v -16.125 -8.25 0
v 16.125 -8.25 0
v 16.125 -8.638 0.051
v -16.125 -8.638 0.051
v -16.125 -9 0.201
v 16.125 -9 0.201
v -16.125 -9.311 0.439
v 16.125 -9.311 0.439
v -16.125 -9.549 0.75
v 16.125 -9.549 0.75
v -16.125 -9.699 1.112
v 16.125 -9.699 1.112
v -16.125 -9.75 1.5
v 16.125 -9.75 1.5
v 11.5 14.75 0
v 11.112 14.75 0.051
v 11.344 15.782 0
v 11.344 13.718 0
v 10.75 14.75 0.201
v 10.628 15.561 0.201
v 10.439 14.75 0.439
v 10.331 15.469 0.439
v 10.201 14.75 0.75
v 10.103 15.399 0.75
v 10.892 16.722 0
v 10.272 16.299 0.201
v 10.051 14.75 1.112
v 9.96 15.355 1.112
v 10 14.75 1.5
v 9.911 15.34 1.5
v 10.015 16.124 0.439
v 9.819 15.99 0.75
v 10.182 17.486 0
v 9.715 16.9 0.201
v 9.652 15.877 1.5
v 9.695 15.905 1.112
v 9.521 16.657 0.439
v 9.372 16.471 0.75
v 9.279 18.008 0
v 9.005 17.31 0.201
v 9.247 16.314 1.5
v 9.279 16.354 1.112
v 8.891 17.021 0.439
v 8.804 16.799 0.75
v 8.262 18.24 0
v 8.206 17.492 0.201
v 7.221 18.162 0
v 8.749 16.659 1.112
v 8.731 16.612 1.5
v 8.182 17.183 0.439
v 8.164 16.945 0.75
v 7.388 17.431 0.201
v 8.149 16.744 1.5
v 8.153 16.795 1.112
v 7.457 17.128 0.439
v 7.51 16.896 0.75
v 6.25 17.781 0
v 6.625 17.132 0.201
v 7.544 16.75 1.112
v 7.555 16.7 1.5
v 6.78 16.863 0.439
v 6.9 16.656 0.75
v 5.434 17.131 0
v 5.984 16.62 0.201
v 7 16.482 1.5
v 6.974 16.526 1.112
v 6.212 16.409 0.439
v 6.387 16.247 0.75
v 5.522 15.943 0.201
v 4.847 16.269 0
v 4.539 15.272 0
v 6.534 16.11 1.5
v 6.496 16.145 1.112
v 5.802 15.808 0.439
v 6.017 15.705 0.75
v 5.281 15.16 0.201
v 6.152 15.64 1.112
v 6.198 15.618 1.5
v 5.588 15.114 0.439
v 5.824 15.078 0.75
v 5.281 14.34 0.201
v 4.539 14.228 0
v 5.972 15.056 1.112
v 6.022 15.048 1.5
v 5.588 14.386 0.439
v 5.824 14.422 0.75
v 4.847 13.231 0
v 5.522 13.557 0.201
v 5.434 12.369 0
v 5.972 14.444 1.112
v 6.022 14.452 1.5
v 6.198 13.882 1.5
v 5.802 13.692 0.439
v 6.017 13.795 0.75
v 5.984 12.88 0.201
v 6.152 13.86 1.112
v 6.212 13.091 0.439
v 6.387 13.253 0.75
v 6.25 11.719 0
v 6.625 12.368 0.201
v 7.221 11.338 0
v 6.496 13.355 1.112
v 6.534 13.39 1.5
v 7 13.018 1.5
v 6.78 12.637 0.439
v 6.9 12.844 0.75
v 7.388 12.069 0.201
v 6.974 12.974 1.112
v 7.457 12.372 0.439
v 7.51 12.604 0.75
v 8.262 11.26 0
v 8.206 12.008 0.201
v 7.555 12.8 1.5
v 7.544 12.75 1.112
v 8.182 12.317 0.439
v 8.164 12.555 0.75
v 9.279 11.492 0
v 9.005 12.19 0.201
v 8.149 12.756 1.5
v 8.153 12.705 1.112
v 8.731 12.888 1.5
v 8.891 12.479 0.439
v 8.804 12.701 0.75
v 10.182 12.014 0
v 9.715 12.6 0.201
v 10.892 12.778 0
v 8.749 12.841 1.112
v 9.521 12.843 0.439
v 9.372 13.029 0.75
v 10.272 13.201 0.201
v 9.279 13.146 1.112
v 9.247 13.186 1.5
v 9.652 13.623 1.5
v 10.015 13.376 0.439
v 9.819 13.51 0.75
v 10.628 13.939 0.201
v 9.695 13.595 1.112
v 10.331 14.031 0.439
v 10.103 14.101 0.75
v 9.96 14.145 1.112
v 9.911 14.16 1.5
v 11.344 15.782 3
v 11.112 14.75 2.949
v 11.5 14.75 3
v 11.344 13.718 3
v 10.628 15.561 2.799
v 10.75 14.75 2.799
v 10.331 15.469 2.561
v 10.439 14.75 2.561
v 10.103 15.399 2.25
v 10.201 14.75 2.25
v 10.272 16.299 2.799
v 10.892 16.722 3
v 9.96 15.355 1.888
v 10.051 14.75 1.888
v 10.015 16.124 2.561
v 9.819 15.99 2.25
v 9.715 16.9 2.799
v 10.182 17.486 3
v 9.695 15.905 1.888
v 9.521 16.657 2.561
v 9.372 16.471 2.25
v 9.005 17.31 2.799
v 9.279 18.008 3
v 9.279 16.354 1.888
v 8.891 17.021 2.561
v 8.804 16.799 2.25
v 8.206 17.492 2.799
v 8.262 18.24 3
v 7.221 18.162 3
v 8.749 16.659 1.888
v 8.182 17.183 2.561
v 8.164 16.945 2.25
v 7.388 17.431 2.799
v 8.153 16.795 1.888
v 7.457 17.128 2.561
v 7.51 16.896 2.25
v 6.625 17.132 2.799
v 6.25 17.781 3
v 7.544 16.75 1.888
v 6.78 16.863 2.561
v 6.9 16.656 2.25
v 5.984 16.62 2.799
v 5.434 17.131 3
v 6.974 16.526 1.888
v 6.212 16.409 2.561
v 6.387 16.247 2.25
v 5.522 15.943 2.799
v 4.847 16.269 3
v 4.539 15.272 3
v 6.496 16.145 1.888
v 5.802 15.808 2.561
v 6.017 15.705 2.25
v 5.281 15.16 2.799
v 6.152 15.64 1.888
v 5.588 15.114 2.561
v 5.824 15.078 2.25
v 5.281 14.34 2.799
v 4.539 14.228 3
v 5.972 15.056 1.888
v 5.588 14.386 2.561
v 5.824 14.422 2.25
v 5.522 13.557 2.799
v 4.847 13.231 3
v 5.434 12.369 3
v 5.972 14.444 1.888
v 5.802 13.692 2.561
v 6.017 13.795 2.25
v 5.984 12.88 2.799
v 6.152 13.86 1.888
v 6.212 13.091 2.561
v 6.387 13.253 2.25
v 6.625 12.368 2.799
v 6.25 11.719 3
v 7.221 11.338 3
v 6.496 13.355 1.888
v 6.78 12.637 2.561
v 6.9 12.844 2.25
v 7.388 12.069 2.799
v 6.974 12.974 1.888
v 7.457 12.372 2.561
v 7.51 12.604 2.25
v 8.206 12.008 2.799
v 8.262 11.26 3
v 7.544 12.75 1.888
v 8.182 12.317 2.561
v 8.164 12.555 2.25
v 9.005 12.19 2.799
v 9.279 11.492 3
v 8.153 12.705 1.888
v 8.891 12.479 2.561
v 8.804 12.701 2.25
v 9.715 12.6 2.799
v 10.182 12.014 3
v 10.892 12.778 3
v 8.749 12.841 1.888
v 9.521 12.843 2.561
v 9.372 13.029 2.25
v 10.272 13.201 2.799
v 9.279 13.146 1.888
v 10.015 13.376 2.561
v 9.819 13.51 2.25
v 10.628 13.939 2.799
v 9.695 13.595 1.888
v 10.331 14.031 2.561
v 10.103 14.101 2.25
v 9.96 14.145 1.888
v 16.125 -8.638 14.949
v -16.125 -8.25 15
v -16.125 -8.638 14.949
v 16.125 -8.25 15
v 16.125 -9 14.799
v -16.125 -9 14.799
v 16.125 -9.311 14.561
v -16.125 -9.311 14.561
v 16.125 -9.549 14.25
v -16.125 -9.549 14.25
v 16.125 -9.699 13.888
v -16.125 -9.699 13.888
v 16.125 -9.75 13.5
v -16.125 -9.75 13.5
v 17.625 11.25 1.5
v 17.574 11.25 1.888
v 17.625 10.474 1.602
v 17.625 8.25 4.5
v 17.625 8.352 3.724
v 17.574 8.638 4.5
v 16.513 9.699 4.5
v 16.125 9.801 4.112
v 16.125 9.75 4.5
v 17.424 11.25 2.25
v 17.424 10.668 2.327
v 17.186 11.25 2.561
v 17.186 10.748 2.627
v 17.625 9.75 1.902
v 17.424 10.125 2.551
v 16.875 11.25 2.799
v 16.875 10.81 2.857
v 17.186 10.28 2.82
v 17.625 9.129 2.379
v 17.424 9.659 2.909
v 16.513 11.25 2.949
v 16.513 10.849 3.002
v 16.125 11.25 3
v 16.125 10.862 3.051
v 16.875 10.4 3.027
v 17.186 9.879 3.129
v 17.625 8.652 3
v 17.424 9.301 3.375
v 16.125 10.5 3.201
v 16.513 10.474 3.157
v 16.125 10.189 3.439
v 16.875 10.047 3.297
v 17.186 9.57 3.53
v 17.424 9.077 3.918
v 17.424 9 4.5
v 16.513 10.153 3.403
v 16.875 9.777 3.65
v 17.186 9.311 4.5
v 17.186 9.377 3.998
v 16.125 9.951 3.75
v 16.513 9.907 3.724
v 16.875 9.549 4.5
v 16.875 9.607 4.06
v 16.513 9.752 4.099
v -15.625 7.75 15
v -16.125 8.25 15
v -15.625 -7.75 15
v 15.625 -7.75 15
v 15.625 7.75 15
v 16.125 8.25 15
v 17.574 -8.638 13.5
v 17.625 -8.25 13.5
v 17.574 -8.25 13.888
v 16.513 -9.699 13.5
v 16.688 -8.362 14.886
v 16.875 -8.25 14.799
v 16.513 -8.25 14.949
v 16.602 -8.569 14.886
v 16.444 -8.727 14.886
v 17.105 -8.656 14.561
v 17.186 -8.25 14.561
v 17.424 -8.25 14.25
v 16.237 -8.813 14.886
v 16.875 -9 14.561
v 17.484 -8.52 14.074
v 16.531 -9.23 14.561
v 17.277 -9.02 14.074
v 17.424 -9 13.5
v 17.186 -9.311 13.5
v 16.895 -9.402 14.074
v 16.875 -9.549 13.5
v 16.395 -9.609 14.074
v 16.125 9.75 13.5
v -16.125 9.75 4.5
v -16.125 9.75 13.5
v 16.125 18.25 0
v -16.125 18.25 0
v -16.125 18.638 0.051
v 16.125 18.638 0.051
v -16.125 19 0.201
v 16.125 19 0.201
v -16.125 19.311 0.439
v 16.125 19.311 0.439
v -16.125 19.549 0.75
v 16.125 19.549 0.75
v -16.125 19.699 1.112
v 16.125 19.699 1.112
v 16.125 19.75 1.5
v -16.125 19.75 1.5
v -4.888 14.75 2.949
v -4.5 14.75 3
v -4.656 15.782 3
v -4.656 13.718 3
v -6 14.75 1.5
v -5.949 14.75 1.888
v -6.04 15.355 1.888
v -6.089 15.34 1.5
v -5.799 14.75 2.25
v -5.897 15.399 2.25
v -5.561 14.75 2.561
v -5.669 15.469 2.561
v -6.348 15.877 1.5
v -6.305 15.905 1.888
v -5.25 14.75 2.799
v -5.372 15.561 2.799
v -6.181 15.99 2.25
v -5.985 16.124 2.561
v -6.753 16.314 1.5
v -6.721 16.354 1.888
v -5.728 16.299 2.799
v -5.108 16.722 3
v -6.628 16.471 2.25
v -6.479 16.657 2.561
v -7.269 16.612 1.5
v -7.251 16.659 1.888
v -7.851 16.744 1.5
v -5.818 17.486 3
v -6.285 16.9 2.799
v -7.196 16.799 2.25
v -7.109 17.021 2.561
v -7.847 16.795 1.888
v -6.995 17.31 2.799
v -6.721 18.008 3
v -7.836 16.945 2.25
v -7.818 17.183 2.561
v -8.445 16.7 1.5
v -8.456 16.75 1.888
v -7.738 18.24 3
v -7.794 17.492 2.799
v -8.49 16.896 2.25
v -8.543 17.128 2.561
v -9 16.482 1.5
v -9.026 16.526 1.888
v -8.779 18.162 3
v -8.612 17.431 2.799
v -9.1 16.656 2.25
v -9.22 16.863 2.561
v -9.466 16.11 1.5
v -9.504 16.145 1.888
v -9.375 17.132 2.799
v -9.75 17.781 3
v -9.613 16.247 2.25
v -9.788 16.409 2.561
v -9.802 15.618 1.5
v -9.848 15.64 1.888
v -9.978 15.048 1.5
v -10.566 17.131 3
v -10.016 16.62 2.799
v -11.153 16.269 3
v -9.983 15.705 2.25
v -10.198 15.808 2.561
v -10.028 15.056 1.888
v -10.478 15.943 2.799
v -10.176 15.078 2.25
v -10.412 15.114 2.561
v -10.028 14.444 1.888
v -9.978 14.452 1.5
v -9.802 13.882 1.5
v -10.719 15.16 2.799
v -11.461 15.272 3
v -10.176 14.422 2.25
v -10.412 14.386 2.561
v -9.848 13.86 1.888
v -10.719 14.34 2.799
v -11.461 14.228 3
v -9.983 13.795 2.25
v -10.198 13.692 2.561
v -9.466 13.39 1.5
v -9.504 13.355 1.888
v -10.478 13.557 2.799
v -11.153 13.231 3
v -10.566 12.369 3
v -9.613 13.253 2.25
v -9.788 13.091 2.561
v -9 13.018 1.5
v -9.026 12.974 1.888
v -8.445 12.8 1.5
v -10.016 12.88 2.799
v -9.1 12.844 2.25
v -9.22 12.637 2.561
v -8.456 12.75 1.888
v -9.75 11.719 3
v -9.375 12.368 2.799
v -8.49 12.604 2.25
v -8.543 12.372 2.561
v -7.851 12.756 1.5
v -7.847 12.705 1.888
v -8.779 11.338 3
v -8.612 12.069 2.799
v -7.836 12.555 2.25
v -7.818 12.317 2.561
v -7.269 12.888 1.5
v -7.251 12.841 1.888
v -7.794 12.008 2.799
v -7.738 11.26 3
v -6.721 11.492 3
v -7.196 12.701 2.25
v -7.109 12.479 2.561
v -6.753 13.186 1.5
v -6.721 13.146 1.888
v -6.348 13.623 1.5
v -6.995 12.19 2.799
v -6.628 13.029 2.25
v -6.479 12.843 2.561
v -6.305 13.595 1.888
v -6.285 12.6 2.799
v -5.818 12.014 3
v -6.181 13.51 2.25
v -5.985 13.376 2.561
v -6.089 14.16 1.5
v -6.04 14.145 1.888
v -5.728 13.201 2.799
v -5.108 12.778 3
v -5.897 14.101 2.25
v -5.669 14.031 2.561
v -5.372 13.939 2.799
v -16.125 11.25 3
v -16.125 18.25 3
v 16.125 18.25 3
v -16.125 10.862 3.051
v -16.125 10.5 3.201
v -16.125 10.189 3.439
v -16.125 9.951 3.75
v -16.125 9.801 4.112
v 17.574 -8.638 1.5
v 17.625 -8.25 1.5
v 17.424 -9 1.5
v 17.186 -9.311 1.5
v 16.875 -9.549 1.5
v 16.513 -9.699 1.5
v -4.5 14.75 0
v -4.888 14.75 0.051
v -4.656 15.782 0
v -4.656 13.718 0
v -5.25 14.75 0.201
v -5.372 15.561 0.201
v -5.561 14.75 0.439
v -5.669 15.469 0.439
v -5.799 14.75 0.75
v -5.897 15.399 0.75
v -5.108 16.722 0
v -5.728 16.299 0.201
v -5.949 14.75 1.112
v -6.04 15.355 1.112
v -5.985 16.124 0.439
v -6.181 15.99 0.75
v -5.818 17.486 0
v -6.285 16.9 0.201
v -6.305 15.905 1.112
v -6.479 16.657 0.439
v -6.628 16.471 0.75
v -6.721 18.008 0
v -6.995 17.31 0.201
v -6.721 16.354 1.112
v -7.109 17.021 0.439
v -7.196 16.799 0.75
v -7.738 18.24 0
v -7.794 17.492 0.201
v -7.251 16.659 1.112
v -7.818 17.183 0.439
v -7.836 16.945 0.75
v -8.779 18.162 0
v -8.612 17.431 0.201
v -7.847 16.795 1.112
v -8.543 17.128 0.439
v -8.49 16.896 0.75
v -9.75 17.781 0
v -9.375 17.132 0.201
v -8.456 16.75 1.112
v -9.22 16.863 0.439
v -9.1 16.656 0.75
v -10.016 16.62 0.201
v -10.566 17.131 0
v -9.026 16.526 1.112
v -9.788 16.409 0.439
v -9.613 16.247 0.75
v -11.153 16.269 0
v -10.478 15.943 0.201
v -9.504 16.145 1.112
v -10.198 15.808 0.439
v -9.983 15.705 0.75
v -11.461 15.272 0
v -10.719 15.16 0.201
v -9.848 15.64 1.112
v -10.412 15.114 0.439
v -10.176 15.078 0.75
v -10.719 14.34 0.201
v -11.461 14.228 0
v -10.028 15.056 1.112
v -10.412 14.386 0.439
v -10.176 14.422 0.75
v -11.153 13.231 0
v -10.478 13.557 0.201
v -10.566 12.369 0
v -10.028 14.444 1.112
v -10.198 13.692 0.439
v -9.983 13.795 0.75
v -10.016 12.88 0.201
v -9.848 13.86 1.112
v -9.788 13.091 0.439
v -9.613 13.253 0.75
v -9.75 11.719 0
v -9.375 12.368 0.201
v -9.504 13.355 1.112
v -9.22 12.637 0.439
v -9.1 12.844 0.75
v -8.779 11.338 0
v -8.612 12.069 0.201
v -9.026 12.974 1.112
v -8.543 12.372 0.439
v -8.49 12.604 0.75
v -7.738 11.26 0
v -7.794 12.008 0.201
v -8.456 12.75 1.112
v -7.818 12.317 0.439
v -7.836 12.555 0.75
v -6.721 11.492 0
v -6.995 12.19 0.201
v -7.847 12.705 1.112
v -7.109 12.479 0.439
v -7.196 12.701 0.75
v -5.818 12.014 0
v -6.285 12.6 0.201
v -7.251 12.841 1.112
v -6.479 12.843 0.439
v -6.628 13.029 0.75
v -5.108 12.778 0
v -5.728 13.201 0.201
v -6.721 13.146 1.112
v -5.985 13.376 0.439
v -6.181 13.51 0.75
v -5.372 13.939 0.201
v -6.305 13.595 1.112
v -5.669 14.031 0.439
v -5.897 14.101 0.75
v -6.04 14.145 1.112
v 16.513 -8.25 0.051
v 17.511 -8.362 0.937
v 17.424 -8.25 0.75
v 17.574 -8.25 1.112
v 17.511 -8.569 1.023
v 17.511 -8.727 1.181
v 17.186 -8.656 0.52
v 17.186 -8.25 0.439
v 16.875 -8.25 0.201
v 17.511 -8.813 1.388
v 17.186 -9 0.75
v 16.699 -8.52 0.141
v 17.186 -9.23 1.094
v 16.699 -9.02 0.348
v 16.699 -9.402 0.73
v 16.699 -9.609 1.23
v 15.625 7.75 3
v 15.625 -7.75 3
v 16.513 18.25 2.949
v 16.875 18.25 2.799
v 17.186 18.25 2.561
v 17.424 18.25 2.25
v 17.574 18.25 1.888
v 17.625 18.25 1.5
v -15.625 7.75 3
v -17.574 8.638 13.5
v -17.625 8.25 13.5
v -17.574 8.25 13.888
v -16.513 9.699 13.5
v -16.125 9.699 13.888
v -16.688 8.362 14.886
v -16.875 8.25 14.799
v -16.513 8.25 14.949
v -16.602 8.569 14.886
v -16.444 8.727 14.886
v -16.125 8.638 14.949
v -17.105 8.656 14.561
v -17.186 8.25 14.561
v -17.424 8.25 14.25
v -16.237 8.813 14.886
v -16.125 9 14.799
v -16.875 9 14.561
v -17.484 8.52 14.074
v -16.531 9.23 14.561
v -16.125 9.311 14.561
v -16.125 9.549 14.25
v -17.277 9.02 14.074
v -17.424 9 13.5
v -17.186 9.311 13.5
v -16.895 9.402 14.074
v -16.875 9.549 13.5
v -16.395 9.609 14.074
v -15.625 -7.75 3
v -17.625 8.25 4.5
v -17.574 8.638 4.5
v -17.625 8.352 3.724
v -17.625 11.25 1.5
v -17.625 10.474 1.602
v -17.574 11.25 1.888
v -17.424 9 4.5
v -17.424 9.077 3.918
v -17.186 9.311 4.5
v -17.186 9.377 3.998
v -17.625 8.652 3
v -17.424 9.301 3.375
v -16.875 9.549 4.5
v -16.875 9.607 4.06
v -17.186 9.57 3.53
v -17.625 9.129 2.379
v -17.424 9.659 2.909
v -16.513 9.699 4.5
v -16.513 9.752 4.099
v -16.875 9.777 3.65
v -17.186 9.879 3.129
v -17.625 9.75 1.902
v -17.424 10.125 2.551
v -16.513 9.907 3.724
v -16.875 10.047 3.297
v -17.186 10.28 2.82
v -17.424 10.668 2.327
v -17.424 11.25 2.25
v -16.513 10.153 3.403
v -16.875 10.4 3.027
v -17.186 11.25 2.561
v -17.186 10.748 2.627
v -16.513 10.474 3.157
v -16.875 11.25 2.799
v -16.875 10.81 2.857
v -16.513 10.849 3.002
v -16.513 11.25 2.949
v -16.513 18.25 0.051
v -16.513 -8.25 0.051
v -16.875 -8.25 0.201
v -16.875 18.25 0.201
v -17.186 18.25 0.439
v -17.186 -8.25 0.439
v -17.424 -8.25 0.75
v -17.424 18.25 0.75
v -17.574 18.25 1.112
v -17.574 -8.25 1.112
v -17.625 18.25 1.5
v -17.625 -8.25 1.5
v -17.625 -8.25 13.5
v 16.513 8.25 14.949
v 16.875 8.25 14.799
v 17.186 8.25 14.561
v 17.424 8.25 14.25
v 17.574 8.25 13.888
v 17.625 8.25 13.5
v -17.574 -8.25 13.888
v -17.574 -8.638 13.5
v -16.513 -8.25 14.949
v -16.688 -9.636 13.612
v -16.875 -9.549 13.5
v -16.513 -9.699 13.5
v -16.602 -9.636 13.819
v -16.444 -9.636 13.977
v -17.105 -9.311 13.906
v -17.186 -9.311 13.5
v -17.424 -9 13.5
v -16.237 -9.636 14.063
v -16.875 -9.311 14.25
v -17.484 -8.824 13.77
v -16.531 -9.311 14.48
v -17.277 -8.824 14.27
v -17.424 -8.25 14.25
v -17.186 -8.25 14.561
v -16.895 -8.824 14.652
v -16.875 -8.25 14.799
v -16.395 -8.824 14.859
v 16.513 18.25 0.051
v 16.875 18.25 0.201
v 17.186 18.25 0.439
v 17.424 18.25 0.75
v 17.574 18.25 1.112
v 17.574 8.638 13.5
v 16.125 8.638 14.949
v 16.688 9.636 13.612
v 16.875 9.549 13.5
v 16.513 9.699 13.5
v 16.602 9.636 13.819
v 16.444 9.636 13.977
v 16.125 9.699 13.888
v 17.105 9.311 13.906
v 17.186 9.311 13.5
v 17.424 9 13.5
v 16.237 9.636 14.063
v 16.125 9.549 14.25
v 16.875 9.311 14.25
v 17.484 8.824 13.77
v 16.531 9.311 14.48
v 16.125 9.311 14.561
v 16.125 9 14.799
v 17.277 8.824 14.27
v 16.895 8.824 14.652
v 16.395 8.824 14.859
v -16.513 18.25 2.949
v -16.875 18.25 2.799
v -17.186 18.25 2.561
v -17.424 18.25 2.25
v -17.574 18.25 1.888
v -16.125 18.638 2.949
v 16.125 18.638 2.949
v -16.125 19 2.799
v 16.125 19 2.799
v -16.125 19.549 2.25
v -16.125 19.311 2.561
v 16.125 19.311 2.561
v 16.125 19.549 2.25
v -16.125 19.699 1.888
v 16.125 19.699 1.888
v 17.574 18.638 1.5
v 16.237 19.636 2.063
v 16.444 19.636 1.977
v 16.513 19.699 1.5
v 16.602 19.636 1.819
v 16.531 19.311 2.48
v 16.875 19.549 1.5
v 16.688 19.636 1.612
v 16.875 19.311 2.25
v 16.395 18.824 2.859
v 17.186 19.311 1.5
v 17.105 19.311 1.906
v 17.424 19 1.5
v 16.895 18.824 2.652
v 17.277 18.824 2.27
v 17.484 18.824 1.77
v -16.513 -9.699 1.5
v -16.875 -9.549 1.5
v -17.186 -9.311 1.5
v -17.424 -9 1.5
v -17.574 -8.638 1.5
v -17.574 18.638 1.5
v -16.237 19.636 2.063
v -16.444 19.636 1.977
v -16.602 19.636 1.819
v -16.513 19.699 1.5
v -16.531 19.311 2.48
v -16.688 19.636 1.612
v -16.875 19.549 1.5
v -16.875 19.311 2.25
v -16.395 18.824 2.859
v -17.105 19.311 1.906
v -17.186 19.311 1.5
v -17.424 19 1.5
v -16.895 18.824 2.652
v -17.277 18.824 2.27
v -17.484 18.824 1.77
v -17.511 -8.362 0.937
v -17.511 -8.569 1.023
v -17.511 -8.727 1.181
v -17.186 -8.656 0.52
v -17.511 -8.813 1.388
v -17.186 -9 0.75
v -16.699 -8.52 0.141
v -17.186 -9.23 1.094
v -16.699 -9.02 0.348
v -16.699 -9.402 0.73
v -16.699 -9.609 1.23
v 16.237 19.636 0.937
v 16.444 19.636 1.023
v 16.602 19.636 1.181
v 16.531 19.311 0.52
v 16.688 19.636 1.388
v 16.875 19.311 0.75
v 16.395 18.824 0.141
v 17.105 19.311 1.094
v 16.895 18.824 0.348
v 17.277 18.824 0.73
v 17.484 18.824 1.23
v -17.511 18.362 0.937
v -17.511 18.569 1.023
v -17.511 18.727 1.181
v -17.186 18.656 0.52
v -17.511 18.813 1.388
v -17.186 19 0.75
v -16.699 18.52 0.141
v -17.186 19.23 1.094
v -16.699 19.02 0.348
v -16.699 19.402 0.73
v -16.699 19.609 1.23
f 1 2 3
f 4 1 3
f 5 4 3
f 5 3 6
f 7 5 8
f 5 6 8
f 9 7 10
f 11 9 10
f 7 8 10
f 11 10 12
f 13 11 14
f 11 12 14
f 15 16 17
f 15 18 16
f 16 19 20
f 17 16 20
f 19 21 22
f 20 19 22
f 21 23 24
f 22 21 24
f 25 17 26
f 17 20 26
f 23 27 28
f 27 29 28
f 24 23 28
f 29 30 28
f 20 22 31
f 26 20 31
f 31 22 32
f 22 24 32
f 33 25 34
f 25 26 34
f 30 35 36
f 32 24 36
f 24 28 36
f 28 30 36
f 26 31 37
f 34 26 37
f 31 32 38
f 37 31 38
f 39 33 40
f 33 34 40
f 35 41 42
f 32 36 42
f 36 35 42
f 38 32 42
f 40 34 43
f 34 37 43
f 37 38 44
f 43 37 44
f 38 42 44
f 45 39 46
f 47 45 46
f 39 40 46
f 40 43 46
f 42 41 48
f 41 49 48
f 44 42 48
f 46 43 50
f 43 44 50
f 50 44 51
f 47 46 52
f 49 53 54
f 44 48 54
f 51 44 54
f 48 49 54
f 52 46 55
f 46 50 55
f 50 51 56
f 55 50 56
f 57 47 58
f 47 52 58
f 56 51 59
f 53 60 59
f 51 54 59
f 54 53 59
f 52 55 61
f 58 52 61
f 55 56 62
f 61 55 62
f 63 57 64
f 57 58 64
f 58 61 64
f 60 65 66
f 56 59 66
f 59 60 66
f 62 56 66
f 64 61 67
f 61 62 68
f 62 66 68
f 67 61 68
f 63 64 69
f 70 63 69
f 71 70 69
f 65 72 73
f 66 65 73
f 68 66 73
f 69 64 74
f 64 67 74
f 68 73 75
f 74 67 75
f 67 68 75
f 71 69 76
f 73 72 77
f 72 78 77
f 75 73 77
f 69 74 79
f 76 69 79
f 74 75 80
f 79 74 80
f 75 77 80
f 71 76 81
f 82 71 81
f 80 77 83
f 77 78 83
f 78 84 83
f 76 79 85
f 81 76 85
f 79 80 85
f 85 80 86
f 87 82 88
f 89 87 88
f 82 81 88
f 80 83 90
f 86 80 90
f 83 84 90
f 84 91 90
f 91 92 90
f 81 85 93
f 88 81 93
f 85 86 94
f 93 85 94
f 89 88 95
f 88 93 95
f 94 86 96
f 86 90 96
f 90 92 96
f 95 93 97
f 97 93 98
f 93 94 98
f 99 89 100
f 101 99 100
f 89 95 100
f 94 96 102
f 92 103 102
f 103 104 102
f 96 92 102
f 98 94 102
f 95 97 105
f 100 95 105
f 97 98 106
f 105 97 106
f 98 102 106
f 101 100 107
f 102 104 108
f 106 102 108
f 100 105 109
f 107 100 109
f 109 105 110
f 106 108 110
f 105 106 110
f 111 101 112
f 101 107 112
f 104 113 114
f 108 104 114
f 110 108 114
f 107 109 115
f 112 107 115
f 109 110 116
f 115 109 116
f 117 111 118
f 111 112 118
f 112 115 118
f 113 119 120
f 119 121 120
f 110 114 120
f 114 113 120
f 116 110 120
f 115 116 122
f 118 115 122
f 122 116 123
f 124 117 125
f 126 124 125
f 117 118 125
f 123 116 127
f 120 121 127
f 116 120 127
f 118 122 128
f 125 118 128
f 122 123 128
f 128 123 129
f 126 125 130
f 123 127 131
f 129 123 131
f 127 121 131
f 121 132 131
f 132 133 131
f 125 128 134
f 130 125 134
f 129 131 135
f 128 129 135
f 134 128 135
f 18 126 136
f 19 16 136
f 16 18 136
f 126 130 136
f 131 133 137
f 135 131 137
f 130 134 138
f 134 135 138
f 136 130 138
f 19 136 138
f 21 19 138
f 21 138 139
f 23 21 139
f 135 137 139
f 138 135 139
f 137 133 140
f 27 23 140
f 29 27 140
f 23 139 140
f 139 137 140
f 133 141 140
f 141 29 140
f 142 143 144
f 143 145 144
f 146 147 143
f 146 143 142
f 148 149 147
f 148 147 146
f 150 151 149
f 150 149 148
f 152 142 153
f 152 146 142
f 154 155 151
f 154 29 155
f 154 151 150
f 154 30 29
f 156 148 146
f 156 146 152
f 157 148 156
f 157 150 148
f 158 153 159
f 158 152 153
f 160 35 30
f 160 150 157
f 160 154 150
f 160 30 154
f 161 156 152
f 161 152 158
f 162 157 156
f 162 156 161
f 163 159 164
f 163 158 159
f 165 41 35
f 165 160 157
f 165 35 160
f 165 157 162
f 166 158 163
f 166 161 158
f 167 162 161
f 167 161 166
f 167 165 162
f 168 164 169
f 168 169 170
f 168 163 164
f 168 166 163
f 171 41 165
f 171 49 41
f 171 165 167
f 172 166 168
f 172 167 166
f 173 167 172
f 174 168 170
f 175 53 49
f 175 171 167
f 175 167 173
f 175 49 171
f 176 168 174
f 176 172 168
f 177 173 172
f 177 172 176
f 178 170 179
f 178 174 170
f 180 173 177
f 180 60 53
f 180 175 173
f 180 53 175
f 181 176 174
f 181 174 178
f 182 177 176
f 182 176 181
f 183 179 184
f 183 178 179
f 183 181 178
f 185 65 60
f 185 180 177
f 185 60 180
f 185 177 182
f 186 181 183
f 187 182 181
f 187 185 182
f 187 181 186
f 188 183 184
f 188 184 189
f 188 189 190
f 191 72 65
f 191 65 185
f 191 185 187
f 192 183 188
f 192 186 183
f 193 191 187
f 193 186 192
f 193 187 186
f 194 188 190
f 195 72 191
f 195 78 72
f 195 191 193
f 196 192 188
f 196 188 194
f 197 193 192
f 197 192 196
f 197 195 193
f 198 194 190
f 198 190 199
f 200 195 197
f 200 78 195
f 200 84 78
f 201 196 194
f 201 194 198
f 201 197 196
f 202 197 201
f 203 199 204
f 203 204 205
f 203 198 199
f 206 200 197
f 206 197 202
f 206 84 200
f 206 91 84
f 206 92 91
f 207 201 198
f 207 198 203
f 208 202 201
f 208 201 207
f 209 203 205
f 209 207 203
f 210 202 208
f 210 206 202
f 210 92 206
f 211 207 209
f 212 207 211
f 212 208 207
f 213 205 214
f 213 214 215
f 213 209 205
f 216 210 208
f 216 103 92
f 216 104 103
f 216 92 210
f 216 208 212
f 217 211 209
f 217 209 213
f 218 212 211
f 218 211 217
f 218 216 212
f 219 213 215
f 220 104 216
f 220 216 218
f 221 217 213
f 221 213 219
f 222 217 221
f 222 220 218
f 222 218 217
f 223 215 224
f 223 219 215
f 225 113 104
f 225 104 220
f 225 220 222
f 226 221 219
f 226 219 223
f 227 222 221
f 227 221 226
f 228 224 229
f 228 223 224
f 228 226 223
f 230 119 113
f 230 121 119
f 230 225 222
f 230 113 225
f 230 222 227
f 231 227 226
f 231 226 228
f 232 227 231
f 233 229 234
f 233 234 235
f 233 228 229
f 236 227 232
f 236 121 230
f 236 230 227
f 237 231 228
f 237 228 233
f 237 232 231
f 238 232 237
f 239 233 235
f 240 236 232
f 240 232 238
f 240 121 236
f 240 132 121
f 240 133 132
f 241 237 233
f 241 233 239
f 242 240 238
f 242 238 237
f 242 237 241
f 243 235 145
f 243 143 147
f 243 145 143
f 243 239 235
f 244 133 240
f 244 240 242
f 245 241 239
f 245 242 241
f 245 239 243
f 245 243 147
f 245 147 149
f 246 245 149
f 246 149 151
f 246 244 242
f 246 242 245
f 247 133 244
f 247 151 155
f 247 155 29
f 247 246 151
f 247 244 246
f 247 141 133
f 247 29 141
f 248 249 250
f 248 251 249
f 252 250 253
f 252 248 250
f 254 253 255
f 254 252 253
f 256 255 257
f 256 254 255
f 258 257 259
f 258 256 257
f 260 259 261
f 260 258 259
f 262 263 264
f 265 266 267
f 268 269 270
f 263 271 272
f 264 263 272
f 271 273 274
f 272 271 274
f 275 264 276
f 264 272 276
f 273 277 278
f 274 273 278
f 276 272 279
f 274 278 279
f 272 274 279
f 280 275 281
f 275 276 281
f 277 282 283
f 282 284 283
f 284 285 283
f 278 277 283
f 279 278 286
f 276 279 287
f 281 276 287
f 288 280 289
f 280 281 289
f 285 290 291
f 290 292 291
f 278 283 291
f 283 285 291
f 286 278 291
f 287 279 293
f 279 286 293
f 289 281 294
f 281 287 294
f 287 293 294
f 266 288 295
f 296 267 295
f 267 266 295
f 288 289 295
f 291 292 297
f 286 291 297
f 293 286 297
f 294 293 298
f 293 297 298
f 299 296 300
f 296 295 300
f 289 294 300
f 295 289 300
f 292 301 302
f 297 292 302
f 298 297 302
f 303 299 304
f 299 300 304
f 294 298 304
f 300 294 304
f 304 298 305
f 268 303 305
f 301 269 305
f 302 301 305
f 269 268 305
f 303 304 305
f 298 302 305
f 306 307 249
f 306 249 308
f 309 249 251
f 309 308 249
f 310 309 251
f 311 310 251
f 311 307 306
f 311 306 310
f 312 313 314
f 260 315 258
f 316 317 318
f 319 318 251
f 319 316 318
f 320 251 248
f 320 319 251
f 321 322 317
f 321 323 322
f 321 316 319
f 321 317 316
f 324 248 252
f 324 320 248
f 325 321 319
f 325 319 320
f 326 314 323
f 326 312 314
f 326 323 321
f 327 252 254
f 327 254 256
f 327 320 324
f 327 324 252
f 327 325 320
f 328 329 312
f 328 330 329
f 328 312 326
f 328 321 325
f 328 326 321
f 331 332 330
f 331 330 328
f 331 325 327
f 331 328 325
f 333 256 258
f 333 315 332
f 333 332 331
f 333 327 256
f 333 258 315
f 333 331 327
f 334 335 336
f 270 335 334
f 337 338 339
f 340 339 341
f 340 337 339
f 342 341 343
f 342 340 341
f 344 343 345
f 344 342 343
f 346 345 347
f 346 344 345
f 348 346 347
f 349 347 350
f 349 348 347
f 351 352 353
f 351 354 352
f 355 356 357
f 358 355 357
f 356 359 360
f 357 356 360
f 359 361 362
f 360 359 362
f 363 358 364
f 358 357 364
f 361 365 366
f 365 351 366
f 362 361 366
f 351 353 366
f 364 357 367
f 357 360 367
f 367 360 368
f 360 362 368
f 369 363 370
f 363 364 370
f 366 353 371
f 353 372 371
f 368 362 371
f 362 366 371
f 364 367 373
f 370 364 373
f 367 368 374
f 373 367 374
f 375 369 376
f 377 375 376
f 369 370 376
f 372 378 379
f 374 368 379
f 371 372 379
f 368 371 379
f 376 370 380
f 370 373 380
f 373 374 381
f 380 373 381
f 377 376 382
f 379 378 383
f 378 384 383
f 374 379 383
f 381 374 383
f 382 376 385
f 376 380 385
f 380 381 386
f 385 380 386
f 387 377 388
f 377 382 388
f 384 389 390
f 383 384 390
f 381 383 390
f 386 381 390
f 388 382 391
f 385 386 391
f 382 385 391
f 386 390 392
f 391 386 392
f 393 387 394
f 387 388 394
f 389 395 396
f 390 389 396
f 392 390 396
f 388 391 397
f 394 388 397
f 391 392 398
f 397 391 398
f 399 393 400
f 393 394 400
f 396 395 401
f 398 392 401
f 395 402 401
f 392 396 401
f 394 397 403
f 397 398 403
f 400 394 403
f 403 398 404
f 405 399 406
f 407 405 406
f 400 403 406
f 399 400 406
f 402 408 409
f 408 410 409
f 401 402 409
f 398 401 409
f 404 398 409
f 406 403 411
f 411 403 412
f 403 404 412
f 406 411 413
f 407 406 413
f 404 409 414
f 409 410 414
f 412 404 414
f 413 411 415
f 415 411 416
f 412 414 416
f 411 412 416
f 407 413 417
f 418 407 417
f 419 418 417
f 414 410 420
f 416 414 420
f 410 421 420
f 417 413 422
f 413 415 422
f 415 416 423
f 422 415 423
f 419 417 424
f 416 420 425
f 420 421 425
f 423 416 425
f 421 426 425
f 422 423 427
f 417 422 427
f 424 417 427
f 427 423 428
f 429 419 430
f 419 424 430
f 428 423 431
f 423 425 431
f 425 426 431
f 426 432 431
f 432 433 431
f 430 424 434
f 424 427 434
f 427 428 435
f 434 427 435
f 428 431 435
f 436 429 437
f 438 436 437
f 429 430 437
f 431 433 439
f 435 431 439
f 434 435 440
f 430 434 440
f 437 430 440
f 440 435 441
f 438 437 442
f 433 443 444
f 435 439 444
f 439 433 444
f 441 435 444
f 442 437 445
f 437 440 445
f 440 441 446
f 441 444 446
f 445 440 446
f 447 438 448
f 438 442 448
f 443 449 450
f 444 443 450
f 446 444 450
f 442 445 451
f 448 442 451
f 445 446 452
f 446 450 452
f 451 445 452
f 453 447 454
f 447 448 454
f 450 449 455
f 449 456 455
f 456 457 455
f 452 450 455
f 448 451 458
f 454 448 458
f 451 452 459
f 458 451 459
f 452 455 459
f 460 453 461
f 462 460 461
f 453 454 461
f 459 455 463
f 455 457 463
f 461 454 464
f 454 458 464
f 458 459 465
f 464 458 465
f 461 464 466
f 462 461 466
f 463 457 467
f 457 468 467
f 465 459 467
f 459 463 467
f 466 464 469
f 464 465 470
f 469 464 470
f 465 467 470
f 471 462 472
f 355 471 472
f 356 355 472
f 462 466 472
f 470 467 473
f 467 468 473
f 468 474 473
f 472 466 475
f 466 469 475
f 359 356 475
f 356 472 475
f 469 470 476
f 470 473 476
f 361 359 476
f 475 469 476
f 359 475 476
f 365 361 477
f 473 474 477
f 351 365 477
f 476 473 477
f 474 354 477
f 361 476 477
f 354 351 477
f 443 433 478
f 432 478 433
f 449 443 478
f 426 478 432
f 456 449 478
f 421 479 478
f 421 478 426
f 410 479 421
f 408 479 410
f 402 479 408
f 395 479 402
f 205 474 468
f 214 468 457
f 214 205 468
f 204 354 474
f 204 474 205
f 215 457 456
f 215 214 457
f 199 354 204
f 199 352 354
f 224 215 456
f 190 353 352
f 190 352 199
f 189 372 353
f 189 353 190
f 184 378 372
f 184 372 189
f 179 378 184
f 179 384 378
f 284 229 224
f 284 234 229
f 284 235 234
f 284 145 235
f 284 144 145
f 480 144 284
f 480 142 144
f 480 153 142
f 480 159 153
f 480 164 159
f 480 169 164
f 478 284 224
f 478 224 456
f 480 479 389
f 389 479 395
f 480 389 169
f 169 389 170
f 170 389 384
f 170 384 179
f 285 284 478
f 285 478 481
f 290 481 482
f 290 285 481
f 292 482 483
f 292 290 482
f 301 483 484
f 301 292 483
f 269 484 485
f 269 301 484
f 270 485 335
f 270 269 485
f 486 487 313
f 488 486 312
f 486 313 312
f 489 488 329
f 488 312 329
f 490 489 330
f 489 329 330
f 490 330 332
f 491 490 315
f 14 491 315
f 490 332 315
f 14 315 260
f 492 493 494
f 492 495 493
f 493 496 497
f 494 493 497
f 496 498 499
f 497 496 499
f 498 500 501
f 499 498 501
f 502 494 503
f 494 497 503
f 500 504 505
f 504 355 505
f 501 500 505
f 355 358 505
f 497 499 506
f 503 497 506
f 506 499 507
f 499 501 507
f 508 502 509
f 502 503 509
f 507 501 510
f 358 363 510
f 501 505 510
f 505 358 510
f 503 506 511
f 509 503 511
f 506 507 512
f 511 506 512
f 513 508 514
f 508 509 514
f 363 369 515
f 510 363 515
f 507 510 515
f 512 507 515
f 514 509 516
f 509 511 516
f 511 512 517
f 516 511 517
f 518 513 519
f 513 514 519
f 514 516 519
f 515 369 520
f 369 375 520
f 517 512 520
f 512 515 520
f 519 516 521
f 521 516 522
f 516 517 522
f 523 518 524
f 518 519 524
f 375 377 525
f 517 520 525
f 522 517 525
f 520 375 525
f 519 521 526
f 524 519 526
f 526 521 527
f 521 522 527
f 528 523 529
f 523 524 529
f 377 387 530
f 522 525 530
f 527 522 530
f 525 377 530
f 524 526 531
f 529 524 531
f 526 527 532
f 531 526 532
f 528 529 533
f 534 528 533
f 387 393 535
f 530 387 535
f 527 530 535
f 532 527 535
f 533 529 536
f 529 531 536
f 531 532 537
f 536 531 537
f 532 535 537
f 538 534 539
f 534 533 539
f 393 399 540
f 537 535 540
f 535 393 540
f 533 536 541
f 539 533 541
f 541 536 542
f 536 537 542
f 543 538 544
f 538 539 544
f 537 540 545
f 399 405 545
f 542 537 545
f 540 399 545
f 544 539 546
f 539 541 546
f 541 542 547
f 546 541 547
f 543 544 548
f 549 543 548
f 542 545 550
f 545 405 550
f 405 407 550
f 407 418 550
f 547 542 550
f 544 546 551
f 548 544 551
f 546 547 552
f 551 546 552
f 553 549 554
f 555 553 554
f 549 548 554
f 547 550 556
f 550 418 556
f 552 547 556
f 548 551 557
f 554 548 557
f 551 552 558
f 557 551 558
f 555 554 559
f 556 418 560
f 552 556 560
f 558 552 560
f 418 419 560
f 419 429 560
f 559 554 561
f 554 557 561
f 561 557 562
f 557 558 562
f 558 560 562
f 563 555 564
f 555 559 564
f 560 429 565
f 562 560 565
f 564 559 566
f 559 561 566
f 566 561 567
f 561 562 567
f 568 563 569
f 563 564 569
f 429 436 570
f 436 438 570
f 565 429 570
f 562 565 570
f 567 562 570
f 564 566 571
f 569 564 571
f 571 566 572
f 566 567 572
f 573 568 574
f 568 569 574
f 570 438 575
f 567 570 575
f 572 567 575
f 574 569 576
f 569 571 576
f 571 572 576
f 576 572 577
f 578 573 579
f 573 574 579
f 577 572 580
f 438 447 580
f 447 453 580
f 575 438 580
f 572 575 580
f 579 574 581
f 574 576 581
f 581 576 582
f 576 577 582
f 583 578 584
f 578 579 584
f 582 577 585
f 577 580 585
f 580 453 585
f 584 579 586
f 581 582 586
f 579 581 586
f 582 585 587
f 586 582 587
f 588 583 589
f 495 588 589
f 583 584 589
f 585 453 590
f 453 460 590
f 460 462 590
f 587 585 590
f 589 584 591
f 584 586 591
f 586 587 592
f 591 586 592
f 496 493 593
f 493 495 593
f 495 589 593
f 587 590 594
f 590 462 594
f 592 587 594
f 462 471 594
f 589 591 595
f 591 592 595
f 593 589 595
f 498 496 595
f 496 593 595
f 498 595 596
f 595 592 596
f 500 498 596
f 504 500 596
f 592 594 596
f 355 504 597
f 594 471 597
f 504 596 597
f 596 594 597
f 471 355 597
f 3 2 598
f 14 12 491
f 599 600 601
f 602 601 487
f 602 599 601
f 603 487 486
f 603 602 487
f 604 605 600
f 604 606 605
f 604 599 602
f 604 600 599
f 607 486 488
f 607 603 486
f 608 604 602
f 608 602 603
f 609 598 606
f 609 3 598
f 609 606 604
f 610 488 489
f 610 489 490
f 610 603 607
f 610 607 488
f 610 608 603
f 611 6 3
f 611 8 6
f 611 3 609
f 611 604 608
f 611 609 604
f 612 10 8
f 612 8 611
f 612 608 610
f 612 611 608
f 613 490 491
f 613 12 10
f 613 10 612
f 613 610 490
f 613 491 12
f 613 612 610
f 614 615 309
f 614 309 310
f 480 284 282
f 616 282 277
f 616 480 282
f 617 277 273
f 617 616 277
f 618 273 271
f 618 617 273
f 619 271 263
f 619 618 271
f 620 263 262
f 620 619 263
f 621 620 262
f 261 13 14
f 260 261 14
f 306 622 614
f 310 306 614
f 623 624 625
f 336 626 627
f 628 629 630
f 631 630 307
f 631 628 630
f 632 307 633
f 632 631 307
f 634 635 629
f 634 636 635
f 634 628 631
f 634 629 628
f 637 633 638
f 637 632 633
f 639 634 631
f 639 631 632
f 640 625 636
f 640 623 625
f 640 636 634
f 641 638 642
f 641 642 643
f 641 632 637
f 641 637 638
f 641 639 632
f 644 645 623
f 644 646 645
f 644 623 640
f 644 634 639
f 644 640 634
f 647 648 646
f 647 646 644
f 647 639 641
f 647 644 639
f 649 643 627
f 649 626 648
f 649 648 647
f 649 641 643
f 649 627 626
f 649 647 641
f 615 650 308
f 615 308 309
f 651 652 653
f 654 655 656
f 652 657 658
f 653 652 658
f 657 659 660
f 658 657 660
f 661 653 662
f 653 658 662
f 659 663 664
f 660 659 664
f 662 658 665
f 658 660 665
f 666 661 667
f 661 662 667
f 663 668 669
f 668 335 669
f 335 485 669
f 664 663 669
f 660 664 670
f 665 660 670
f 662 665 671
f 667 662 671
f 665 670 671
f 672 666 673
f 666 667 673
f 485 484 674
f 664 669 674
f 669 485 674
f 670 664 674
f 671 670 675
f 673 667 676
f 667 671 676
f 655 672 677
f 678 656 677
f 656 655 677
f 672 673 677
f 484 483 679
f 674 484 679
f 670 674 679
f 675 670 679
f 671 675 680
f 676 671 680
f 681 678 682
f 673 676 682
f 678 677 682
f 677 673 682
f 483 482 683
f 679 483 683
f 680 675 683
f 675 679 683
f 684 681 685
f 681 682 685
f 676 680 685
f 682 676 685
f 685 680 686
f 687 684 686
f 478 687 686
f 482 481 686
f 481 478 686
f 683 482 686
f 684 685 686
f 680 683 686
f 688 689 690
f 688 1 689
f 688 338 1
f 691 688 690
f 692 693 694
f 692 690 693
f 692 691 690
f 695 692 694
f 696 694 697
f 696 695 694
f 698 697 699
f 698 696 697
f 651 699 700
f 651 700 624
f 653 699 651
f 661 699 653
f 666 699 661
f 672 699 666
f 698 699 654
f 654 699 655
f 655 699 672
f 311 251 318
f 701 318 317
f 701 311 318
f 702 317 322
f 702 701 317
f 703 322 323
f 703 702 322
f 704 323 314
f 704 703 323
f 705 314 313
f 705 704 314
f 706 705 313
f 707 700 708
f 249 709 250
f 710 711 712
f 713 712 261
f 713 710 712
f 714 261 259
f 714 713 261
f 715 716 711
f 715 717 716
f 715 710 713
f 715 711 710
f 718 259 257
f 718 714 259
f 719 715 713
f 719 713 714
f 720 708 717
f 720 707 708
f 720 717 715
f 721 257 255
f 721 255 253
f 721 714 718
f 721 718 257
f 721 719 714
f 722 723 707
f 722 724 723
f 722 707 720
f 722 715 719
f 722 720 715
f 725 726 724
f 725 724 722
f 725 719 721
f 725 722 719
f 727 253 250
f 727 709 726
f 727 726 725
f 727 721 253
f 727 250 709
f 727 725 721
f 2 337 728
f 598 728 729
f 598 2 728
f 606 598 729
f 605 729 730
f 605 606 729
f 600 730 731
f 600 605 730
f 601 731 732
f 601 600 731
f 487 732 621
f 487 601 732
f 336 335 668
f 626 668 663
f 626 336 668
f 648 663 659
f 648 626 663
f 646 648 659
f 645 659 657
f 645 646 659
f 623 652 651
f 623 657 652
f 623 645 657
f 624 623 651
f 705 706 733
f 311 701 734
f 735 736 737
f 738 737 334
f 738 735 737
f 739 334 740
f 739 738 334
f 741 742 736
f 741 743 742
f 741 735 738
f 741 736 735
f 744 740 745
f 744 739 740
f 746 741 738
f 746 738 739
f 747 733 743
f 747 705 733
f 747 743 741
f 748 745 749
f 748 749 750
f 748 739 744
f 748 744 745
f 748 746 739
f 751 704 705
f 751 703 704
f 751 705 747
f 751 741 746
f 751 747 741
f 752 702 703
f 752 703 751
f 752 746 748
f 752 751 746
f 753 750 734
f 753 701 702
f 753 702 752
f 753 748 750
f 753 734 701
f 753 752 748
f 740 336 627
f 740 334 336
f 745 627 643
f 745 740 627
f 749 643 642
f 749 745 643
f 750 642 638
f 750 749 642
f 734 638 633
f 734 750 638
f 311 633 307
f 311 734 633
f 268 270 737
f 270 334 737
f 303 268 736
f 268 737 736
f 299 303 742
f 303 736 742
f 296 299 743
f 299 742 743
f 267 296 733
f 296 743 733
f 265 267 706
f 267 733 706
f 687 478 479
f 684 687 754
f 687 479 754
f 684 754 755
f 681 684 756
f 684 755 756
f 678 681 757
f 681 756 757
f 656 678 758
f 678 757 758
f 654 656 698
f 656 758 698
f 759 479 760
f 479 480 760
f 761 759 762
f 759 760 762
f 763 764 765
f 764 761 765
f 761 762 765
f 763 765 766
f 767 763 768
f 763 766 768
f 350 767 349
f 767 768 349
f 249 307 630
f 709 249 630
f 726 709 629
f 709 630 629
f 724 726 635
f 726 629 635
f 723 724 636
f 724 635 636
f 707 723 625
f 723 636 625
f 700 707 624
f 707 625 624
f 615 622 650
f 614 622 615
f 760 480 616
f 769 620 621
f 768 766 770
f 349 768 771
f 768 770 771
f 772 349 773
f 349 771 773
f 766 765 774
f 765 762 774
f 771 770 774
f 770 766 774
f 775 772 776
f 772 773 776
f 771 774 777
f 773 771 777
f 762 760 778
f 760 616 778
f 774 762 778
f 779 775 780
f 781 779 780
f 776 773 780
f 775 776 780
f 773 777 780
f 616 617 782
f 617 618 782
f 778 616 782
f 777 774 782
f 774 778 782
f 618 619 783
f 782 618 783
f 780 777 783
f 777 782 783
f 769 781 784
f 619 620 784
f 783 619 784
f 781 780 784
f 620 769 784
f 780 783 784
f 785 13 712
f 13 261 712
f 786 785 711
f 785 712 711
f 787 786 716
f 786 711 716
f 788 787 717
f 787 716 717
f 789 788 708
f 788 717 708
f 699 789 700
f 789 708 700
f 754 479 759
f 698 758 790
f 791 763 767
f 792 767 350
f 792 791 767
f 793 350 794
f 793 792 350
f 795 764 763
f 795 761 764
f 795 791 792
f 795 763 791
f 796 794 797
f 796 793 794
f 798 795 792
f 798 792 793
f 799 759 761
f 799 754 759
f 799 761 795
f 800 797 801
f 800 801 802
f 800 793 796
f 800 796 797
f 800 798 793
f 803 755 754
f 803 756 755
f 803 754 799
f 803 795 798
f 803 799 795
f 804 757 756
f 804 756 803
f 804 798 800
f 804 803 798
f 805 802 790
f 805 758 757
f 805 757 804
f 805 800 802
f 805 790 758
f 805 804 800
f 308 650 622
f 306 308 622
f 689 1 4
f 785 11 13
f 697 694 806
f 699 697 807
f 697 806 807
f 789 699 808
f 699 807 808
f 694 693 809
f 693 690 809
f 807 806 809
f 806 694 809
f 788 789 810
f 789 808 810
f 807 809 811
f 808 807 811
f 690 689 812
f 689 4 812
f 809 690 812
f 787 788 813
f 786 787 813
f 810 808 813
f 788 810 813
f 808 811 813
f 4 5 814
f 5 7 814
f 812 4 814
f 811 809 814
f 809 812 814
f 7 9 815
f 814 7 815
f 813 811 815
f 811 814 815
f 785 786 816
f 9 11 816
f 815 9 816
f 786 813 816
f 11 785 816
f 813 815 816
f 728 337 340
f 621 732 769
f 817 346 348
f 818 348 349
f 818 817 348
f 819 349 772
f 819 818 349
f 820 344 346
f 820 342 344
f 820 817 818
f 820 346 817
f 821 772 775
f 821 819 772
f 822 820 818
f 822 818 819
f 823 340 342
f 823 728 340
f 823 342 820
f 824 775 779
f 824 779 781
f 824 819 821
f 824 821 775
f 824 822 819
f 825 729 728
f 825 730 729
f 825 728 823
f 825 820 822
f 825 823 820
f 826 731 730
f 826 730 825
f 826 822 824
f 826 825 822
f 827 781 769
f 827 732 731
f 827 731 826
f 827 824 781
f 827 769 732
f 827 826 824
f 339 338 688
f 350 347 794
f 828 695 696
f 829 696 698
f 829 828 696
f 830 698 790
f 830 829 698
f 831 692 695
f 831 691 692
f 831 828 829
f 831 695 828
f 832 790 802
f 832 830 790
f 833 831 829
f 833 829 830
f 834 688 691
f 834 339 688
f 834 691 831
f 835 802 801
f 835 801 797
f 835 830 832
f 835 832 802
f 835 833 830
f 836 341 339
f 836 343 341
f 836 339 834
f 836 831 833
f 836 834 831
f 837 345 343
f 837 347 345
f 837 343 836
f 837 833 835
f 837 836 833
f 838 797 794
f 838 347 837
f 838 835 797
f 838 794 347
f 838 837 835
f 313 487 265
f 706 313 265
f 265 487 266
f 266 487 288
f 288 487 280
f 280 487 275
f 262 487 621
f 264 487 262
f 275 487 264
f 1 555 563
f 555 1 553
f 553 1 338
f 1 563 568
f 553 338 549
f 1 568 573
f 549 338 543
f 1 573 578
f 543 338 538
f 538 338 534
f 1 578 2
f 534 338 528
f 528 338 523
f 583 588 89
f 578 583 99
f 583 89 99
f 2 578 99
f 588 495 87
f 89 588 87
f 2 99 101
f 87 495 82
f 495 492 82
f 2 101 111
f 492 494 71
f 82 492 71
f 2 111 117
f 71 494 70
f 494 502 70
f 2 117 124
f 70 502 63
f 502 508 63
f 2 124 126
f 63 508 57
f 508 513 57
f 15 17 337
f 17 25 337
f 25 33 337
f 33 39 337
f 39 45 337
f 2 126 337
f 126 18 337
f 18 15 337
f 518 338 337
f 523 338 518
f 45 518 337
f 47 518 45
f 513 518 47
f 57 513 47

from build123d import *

# Parameters (mm, degrees)
F0_W     = 35.25
F0_H     = 19.5
F0_W_2   = 31.25
F0_H_2   = 15.5
F1_DEPTH = 15
F0_H_3   = 10
F0_R     = 2
F2_DEPTH = 3
F3_R     = 1.49999


# Not quite as in the source:
# - a fillet or chamfer is up to 0.001 mm smaller than in the source, because OpenCascade refuses the exact size


with BuildPart() as f1:
    # F0 (on Top) → F1 (new body)
    with BuildSketch(Plane.XY):
        Rectangle(F0_W, F0_H)
        Rectangle(F0_W_2, F0_H_2, mode=Mode.SUBTRACT)
    extrude(amount=F1_DEPTH)

    # F0 (on Top) → F2 (join)
    with BuildSketch(Plane.XY):
        Rectangle(F0_W_2, F0_H_2)
        with Locations((0, 14.75)):
            Rectangle(F0_W, F0_H_3)
        with Locations((-8, 14.75)):
            Circle(F0_R, mode=Mode.SUBTRACT)
        with Locations((8, 14.75)):
            Circle(F0_R, mode=Mode.SUBTRACT)
    extrude(amount=F2_DEPTH)

    # F3 (radius 1.5 in the source; OpenCascade refuses exactly that, so slightly less here)
    f3_edges = [f1.edges().sort_by_distance(p)[0] for p in [
        (-17.625, 14.75, 3),
        (0, 9.75, 3),
        (17.625, 14.75, 3),
        (0, 19.75, 3),
        (-10, 14.75, 3),
        (6, 14.75, 3),
        (0, -9.75, 0),
        (17.625, 5, 0),
        (0, 19.75, 0),
        (-17.625, 5, 0),
        (6, 14.75, 0),
        (-10, 14.75, 0),
        (-17.625, 9.75, 9),
        (-17.625, 0, 15),
        (-17.625, -9.75, 7.5),
        (-17.625, 19.75, 1.5),
        (17.625, -9.75, 7.5),
        (17.625, 0, 15),
        (17.625, 9.75, 9),
        (17.625, 19.75, 1.5),
        (0, -9.75, 15),
        (0, 9.75, 15),
    ]]
    fillet(f3_edges, radius=F3_R)


solid = f1.part
